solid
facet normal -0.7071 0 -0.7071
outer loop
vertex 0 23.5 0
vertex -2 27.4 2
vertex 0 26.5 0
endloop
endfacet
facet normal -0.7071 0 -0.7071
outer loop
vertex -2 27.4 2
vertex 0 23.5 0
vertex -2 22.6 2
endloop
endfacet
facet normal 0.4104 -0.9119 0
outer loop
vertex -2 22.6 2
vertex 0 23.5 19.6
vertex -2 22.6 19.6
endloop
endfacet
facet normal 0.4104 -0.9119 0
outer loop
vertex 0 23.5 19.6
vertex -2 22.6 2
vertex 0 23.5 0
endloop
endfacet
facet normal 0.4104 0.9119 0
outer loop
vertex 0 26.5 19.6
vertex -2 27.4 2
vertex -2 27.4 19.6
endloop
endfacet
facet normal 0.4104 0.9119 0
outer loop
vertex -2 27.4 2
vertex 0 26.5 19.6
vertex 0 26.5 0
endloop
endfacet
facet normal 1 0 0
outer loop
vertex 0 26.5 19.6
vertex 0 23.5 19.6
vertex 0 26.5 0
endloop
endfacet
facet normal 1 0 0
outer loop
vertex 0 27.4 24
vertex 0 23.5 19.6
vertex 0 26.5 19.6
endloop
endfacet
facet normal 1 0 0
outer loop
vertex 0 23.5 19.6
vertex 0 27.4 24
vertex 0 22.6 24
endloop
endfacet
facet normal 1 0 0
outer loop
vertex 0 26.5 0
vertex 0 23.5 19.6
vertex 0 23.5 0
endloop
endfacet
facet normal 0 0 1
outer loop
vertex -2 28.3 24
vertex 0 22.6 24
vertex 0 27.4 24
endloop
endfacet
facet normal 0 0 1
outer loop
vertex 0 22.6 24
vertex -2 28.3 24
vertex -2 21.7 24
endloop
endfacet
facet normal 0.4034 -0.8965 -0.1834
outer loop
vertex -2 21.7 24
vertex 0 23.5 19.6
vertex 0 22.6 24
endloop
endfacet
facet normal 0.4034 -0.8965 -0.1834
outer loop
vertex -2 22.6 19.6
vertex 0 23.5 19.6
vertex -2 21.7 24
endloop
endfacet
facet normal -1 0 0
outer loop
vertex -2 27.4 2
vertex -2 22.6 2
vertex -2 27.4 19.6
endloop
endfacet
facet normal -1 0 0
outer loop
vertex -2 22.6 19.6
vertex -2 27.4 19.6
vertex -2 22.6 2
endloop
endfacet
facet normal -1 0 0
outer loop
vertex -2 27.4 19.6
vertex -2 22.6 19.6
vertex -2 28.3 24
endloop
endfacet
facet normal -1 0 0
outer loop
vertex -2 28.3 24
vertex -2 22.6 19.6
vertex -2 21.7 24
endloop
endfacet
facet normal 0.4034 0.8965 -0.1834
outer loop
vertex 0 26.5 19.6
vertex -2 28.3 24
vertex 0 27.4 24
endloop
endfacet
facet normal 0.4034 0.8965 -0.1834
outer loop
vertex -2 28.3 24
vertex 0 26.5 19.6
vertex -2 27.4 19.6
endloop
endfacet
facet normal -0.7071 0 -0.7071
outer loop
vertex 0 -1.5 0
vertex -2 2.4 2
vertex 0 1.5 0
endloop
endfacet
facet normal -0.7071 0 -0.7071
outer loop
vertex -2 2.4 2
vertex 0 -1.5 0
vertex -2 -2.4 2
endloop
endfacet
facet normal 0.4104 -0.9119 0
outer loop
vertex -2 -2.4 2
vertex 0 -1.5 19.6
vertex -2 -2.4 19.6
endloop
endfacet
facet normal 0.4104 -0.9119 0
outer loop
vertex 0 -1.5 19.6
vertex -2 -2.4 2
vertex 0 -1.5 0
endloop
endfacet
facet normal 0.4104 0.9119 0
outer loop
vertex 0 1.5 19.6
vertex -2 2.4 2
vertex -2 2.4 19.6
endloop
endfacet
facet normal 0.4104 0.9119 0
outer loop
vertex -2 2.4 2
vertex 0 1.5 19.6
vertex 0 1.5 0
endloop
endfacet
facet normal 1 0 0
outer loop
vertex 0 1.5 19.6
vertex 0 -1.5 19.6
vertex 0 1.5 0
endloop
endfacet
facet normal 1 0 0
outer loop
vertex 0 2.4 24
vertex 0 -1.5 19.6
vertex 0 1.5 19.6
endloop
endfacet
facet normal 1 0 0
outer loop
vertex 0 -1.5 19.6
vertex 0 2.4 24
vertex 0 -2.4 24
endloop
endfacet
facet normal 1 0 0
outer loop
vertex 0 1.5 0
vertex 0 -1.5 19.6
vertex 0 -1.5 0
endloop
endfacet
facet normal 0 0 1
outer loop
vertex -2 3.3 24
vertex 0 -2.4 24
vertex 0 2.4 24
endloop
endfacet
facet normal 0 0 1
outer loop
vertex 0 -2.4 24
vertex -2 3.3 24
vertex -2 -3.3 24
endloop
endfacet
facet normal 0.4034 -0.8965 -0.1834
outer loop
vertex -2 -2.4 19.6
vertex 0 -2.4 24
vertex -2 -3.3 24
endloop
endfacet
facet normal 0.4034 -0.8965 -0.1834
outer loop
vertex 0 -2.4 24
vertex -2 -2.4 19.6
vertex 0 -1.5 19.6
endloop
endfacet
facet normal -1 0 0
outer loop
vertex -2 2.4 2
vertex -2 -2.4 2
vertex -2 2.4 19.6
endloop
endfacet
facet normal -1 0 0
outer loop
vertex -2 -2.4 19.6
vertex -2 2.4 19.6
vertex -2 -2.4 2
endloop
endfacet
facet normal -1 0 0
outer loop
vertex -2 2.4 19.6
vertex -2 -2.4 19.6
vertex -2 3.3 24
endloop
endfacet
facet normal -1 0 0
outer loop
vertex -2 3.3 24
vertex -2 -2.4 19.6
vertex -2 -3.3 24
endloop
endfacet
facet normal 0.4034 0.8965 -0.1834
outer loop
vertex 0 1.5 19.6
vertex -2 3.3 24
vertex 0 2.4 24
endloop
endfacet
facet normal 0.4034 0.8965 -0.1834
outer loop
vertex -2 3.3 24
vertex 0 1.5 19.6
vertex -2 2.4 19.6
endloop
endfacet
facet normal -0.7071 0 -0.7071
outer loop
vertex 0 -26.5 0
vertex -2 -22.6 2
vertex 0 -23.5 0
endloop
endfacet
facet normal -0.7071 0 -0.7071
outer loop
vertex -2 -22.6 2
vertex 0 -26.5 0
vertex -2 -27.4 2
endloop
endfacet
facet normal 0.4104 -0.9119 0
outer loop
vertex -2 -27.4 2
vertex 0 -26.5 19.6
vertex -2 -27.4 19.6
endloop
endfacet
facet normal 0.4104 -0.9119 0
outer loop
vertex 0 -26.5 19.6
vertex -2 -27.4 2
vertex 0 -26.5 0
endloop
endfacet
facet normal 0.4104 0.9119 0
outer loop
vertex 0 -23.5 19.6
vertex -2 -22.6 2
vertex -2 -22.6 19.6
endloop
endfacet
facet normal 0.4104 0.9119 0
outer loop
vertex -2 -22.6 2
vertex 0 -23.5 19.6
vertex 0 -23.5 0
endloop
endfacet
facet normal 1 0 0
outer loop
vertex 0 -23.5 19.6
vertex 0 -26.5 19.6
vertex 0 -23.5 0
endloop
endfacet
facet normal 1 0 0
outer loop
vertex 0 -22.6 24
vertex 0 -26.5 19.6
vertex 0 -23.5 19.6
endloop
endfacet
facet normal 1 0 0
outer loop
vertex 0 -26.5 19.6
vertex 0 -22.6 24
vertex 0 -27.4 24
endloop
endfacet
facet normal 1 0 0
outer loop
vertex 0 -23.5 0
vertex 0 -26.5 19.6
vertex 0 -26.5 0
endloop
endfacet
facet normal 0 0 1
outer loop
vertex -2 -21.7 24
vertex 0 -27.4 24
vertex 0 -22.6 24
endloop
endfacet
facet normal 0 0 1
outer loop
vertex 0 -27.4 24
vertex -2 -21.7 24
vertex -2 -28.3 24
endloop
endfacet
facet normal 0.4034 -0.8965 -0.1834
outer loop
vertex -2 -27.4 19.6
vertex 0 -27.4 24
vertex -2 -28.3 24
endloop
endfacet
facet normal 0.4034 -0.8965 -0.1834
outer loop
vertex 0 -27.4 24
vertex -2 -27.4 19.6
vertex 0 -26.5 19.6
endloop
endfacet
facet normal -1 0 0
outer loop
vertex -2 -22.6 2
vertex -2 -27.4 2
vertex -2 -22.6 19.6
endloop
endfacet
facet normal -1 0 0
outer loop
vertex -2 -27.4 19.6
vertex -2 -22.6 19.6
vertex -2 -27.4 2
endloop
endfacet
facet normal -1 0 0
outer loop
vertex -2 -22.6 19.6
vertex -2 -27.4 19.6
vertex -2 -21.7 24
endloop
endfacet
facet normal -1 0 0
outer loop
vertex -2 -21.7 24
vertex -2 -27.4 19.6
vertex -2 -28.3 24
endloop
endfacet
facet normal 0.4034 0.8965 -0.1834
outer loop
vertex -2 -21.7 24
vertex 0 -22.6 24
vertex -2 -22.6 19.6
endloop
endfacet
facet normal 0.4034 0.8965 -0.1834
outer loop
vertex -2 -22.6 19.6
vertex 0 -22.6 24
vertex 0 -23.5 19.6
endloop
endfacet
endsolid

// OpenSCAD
// file: utils.scad
module quickMinkowski(rounding) {
    translate([rounding, rounding, rounding]) minkowski() {
        children();
        sphere(r=rounding);
    }
}
// file: lock.scad
include <config.scad>
use <utils.scad>


module lock_piece(tolerance = 0, max_height = -1) {
    assert(max_height != 0 && max_height >= -1);

    width_big = lock_width/1.65*1.2;
    width_small = lock_width/1.65*0.75;
    width_max = lock_width;

    points = [
        [0, -(width_small + tolerance)/2, -lock_depth],
        [0,  (width_small + tolerance)/2, -lock_depth],
        [lock_depth + tolerance,  (width_big + tolerance)/2, 0],
        [lock_depth + tolerance, -(width_big + tolerance)/2, 0],
        [0, -(width_small + tolerance)/2, 4/5*lock_body_height],
        [0,  (width_small + tolerance)/2, 4/5*lock_body_height],
        [lock_depth + tolerance,  (width_big + tolerance)/2, 4/5*lock_body_height],
        [lock_depth + tolerance, -(width_big + tolerance)/2, 4/5*lock_body_height],
        [0, -(width_big + tolerance)/2, lock_body_height],
        [0,  (width_big + tolerance)/2, lock_body_height],
        [lock_depth + tolerance,  (width_max + tolerance)/2, lock_body_height],
        [lock_depth + tolerance, -(width_max + tolerance)/2, lock_body_height],
    ];
    faces = [
        [0,1,2,3],  // bottom
        [4,5,1,0],  // front
        //[7,6,5,4],  // top
        [5,6,2,1],  // right
        [6,7,3,2],  // back
        [7,4,0,3], // left
        [8,9,5,4], // top front
        [11,10,9,8], // top top
        [9,10,6,5], // top right
        [10,11,7,6], // top back
        [11,8,4,7], // top left
    ];

    if (max_height != -1 && max_height < lock_height) {
        translate([0, 0, max_height - lock_height]) difference() {
            translate([0, 0, lock_depth])  polyhedron(points, faces);

            translate([0, -(width_max + tolerance)/2, 0]) cube([lock_depth + tolerance, width_max + tolerance, lock_height + tolerance - max_height]);
        }
    } else if (max_height > lock_height) {
        translate([0, 0, max_height - lock_body_height]) polyhedron(points, faces);
    } else {
        translate([0, 0, lock_depth]) polyhedron(points, faces);
    }
}


module lock_deprecated(lock_groove = false, max_height = -1) {
    tolerance = (lock_groove == true) ? tolerance : 0;

    for (a = [-lock_distance : lock_distance : lock_distance]) {
        translate([0, a, 0])
          lock_piece(tolerance = tolerance, max_height = max_height);
    }
}


module lock_module(height = -1, length = default_length) {
    height = (height == -1) ? lock_height : height;
    height_move = max(height - lock_body_height - lock_depth, 0);
    length_true = length - 2*rounding;

    module final() {
        difference() {
            quickMinkowski(rounding) cube([lock_module_width_true, length_true, height - 2*rounding]);

            translate([lock_module_width, 0, 0]) cube([rounding, length, height]);
        }

        translate([lock_module_width, length/2, height_move]) lock(max_height = height);
    }

    final();
}


function lock_length(pieces = lock_pieces, padding = 2/3*lock_distance) =
    (pieces-1) * lock_distance + 2*padding;


module key(pieces = lock_pieces, height = -1, padding = 2/3*lock_distance) {
    length = lock_length(pieces, padding);

    module part() {
        for (a = [-length/2 + padding : lock_distance : length/2 - padding]) {
            translate([0, a, 0]) lock_piece(max_height = height);
        }
    }

    rotate([0, 0, 180]) part();
}


module lock(pieces = lock_pieces, height = -1, padding = 2/3*lock_distance) {
    length = lock_length(pieces, padding);

    module part() {
        for (a = [-length/2 + padding : lock_distance : length/2 - padding]) {
            translate([0, a, 0]) lock_piece(tolerance = tolerance, max_height = height);
        }
    }

    part();
}
// file: config.scad
$fs = 0.6;

// user defined parameters
default_length = 100;
plane_thickness = 5;
side_thickness = 4;
table_depth = 20;
table_thickness = 20;
round_corners = true;
screw_size = 10;

//system parameters
tolerance = 0.2;
lock_height = 24;
lock_depth = 2;
lock_width = 6.6;
lock_distance = 25;
lock_pieces = 3;
lock_module_width = 2;
rounding = 1.5;

// computed parameters
lock_body_height = lock_height - lock_depth;
default_length_true = default_length - 2*rounding;
plane_thickness_true = plane_thickness - 2*rounding;
side_thickness_true = side_thickness - rounding;
table_depth_true = table_depth;
handle_depth = table_depth + plane_thickness;
handle_height = 2*plane_thickness + table_thickness + 2*rounding;
screw_type = str("M",screw_size);
lock_module_width_true = lock_module_width - rounding;
// main file
include <config.scad>
use <lock.scad>


module test_key() {
    key();

    //#translate([0, -lock_width2/2, 0]) cube([lock_depth, lock_width2, lock_height]);
}

module test_lockhole_old() {
    difference() {
        cube([2*lock_depth, 2/3*default_length, lock_height]);

        translate([0, 1/3*default_length, 0]) lock(lock_groove = true, max_height = -1);
    }
}

module test_lockhole() {
    difference() {
        cube([2*lock_depth, lock_length(), 30]);

        translate([0, lock_length()/2, 0]) lock(height = 30);
    }
}

test_key();
// test_lockhole();
